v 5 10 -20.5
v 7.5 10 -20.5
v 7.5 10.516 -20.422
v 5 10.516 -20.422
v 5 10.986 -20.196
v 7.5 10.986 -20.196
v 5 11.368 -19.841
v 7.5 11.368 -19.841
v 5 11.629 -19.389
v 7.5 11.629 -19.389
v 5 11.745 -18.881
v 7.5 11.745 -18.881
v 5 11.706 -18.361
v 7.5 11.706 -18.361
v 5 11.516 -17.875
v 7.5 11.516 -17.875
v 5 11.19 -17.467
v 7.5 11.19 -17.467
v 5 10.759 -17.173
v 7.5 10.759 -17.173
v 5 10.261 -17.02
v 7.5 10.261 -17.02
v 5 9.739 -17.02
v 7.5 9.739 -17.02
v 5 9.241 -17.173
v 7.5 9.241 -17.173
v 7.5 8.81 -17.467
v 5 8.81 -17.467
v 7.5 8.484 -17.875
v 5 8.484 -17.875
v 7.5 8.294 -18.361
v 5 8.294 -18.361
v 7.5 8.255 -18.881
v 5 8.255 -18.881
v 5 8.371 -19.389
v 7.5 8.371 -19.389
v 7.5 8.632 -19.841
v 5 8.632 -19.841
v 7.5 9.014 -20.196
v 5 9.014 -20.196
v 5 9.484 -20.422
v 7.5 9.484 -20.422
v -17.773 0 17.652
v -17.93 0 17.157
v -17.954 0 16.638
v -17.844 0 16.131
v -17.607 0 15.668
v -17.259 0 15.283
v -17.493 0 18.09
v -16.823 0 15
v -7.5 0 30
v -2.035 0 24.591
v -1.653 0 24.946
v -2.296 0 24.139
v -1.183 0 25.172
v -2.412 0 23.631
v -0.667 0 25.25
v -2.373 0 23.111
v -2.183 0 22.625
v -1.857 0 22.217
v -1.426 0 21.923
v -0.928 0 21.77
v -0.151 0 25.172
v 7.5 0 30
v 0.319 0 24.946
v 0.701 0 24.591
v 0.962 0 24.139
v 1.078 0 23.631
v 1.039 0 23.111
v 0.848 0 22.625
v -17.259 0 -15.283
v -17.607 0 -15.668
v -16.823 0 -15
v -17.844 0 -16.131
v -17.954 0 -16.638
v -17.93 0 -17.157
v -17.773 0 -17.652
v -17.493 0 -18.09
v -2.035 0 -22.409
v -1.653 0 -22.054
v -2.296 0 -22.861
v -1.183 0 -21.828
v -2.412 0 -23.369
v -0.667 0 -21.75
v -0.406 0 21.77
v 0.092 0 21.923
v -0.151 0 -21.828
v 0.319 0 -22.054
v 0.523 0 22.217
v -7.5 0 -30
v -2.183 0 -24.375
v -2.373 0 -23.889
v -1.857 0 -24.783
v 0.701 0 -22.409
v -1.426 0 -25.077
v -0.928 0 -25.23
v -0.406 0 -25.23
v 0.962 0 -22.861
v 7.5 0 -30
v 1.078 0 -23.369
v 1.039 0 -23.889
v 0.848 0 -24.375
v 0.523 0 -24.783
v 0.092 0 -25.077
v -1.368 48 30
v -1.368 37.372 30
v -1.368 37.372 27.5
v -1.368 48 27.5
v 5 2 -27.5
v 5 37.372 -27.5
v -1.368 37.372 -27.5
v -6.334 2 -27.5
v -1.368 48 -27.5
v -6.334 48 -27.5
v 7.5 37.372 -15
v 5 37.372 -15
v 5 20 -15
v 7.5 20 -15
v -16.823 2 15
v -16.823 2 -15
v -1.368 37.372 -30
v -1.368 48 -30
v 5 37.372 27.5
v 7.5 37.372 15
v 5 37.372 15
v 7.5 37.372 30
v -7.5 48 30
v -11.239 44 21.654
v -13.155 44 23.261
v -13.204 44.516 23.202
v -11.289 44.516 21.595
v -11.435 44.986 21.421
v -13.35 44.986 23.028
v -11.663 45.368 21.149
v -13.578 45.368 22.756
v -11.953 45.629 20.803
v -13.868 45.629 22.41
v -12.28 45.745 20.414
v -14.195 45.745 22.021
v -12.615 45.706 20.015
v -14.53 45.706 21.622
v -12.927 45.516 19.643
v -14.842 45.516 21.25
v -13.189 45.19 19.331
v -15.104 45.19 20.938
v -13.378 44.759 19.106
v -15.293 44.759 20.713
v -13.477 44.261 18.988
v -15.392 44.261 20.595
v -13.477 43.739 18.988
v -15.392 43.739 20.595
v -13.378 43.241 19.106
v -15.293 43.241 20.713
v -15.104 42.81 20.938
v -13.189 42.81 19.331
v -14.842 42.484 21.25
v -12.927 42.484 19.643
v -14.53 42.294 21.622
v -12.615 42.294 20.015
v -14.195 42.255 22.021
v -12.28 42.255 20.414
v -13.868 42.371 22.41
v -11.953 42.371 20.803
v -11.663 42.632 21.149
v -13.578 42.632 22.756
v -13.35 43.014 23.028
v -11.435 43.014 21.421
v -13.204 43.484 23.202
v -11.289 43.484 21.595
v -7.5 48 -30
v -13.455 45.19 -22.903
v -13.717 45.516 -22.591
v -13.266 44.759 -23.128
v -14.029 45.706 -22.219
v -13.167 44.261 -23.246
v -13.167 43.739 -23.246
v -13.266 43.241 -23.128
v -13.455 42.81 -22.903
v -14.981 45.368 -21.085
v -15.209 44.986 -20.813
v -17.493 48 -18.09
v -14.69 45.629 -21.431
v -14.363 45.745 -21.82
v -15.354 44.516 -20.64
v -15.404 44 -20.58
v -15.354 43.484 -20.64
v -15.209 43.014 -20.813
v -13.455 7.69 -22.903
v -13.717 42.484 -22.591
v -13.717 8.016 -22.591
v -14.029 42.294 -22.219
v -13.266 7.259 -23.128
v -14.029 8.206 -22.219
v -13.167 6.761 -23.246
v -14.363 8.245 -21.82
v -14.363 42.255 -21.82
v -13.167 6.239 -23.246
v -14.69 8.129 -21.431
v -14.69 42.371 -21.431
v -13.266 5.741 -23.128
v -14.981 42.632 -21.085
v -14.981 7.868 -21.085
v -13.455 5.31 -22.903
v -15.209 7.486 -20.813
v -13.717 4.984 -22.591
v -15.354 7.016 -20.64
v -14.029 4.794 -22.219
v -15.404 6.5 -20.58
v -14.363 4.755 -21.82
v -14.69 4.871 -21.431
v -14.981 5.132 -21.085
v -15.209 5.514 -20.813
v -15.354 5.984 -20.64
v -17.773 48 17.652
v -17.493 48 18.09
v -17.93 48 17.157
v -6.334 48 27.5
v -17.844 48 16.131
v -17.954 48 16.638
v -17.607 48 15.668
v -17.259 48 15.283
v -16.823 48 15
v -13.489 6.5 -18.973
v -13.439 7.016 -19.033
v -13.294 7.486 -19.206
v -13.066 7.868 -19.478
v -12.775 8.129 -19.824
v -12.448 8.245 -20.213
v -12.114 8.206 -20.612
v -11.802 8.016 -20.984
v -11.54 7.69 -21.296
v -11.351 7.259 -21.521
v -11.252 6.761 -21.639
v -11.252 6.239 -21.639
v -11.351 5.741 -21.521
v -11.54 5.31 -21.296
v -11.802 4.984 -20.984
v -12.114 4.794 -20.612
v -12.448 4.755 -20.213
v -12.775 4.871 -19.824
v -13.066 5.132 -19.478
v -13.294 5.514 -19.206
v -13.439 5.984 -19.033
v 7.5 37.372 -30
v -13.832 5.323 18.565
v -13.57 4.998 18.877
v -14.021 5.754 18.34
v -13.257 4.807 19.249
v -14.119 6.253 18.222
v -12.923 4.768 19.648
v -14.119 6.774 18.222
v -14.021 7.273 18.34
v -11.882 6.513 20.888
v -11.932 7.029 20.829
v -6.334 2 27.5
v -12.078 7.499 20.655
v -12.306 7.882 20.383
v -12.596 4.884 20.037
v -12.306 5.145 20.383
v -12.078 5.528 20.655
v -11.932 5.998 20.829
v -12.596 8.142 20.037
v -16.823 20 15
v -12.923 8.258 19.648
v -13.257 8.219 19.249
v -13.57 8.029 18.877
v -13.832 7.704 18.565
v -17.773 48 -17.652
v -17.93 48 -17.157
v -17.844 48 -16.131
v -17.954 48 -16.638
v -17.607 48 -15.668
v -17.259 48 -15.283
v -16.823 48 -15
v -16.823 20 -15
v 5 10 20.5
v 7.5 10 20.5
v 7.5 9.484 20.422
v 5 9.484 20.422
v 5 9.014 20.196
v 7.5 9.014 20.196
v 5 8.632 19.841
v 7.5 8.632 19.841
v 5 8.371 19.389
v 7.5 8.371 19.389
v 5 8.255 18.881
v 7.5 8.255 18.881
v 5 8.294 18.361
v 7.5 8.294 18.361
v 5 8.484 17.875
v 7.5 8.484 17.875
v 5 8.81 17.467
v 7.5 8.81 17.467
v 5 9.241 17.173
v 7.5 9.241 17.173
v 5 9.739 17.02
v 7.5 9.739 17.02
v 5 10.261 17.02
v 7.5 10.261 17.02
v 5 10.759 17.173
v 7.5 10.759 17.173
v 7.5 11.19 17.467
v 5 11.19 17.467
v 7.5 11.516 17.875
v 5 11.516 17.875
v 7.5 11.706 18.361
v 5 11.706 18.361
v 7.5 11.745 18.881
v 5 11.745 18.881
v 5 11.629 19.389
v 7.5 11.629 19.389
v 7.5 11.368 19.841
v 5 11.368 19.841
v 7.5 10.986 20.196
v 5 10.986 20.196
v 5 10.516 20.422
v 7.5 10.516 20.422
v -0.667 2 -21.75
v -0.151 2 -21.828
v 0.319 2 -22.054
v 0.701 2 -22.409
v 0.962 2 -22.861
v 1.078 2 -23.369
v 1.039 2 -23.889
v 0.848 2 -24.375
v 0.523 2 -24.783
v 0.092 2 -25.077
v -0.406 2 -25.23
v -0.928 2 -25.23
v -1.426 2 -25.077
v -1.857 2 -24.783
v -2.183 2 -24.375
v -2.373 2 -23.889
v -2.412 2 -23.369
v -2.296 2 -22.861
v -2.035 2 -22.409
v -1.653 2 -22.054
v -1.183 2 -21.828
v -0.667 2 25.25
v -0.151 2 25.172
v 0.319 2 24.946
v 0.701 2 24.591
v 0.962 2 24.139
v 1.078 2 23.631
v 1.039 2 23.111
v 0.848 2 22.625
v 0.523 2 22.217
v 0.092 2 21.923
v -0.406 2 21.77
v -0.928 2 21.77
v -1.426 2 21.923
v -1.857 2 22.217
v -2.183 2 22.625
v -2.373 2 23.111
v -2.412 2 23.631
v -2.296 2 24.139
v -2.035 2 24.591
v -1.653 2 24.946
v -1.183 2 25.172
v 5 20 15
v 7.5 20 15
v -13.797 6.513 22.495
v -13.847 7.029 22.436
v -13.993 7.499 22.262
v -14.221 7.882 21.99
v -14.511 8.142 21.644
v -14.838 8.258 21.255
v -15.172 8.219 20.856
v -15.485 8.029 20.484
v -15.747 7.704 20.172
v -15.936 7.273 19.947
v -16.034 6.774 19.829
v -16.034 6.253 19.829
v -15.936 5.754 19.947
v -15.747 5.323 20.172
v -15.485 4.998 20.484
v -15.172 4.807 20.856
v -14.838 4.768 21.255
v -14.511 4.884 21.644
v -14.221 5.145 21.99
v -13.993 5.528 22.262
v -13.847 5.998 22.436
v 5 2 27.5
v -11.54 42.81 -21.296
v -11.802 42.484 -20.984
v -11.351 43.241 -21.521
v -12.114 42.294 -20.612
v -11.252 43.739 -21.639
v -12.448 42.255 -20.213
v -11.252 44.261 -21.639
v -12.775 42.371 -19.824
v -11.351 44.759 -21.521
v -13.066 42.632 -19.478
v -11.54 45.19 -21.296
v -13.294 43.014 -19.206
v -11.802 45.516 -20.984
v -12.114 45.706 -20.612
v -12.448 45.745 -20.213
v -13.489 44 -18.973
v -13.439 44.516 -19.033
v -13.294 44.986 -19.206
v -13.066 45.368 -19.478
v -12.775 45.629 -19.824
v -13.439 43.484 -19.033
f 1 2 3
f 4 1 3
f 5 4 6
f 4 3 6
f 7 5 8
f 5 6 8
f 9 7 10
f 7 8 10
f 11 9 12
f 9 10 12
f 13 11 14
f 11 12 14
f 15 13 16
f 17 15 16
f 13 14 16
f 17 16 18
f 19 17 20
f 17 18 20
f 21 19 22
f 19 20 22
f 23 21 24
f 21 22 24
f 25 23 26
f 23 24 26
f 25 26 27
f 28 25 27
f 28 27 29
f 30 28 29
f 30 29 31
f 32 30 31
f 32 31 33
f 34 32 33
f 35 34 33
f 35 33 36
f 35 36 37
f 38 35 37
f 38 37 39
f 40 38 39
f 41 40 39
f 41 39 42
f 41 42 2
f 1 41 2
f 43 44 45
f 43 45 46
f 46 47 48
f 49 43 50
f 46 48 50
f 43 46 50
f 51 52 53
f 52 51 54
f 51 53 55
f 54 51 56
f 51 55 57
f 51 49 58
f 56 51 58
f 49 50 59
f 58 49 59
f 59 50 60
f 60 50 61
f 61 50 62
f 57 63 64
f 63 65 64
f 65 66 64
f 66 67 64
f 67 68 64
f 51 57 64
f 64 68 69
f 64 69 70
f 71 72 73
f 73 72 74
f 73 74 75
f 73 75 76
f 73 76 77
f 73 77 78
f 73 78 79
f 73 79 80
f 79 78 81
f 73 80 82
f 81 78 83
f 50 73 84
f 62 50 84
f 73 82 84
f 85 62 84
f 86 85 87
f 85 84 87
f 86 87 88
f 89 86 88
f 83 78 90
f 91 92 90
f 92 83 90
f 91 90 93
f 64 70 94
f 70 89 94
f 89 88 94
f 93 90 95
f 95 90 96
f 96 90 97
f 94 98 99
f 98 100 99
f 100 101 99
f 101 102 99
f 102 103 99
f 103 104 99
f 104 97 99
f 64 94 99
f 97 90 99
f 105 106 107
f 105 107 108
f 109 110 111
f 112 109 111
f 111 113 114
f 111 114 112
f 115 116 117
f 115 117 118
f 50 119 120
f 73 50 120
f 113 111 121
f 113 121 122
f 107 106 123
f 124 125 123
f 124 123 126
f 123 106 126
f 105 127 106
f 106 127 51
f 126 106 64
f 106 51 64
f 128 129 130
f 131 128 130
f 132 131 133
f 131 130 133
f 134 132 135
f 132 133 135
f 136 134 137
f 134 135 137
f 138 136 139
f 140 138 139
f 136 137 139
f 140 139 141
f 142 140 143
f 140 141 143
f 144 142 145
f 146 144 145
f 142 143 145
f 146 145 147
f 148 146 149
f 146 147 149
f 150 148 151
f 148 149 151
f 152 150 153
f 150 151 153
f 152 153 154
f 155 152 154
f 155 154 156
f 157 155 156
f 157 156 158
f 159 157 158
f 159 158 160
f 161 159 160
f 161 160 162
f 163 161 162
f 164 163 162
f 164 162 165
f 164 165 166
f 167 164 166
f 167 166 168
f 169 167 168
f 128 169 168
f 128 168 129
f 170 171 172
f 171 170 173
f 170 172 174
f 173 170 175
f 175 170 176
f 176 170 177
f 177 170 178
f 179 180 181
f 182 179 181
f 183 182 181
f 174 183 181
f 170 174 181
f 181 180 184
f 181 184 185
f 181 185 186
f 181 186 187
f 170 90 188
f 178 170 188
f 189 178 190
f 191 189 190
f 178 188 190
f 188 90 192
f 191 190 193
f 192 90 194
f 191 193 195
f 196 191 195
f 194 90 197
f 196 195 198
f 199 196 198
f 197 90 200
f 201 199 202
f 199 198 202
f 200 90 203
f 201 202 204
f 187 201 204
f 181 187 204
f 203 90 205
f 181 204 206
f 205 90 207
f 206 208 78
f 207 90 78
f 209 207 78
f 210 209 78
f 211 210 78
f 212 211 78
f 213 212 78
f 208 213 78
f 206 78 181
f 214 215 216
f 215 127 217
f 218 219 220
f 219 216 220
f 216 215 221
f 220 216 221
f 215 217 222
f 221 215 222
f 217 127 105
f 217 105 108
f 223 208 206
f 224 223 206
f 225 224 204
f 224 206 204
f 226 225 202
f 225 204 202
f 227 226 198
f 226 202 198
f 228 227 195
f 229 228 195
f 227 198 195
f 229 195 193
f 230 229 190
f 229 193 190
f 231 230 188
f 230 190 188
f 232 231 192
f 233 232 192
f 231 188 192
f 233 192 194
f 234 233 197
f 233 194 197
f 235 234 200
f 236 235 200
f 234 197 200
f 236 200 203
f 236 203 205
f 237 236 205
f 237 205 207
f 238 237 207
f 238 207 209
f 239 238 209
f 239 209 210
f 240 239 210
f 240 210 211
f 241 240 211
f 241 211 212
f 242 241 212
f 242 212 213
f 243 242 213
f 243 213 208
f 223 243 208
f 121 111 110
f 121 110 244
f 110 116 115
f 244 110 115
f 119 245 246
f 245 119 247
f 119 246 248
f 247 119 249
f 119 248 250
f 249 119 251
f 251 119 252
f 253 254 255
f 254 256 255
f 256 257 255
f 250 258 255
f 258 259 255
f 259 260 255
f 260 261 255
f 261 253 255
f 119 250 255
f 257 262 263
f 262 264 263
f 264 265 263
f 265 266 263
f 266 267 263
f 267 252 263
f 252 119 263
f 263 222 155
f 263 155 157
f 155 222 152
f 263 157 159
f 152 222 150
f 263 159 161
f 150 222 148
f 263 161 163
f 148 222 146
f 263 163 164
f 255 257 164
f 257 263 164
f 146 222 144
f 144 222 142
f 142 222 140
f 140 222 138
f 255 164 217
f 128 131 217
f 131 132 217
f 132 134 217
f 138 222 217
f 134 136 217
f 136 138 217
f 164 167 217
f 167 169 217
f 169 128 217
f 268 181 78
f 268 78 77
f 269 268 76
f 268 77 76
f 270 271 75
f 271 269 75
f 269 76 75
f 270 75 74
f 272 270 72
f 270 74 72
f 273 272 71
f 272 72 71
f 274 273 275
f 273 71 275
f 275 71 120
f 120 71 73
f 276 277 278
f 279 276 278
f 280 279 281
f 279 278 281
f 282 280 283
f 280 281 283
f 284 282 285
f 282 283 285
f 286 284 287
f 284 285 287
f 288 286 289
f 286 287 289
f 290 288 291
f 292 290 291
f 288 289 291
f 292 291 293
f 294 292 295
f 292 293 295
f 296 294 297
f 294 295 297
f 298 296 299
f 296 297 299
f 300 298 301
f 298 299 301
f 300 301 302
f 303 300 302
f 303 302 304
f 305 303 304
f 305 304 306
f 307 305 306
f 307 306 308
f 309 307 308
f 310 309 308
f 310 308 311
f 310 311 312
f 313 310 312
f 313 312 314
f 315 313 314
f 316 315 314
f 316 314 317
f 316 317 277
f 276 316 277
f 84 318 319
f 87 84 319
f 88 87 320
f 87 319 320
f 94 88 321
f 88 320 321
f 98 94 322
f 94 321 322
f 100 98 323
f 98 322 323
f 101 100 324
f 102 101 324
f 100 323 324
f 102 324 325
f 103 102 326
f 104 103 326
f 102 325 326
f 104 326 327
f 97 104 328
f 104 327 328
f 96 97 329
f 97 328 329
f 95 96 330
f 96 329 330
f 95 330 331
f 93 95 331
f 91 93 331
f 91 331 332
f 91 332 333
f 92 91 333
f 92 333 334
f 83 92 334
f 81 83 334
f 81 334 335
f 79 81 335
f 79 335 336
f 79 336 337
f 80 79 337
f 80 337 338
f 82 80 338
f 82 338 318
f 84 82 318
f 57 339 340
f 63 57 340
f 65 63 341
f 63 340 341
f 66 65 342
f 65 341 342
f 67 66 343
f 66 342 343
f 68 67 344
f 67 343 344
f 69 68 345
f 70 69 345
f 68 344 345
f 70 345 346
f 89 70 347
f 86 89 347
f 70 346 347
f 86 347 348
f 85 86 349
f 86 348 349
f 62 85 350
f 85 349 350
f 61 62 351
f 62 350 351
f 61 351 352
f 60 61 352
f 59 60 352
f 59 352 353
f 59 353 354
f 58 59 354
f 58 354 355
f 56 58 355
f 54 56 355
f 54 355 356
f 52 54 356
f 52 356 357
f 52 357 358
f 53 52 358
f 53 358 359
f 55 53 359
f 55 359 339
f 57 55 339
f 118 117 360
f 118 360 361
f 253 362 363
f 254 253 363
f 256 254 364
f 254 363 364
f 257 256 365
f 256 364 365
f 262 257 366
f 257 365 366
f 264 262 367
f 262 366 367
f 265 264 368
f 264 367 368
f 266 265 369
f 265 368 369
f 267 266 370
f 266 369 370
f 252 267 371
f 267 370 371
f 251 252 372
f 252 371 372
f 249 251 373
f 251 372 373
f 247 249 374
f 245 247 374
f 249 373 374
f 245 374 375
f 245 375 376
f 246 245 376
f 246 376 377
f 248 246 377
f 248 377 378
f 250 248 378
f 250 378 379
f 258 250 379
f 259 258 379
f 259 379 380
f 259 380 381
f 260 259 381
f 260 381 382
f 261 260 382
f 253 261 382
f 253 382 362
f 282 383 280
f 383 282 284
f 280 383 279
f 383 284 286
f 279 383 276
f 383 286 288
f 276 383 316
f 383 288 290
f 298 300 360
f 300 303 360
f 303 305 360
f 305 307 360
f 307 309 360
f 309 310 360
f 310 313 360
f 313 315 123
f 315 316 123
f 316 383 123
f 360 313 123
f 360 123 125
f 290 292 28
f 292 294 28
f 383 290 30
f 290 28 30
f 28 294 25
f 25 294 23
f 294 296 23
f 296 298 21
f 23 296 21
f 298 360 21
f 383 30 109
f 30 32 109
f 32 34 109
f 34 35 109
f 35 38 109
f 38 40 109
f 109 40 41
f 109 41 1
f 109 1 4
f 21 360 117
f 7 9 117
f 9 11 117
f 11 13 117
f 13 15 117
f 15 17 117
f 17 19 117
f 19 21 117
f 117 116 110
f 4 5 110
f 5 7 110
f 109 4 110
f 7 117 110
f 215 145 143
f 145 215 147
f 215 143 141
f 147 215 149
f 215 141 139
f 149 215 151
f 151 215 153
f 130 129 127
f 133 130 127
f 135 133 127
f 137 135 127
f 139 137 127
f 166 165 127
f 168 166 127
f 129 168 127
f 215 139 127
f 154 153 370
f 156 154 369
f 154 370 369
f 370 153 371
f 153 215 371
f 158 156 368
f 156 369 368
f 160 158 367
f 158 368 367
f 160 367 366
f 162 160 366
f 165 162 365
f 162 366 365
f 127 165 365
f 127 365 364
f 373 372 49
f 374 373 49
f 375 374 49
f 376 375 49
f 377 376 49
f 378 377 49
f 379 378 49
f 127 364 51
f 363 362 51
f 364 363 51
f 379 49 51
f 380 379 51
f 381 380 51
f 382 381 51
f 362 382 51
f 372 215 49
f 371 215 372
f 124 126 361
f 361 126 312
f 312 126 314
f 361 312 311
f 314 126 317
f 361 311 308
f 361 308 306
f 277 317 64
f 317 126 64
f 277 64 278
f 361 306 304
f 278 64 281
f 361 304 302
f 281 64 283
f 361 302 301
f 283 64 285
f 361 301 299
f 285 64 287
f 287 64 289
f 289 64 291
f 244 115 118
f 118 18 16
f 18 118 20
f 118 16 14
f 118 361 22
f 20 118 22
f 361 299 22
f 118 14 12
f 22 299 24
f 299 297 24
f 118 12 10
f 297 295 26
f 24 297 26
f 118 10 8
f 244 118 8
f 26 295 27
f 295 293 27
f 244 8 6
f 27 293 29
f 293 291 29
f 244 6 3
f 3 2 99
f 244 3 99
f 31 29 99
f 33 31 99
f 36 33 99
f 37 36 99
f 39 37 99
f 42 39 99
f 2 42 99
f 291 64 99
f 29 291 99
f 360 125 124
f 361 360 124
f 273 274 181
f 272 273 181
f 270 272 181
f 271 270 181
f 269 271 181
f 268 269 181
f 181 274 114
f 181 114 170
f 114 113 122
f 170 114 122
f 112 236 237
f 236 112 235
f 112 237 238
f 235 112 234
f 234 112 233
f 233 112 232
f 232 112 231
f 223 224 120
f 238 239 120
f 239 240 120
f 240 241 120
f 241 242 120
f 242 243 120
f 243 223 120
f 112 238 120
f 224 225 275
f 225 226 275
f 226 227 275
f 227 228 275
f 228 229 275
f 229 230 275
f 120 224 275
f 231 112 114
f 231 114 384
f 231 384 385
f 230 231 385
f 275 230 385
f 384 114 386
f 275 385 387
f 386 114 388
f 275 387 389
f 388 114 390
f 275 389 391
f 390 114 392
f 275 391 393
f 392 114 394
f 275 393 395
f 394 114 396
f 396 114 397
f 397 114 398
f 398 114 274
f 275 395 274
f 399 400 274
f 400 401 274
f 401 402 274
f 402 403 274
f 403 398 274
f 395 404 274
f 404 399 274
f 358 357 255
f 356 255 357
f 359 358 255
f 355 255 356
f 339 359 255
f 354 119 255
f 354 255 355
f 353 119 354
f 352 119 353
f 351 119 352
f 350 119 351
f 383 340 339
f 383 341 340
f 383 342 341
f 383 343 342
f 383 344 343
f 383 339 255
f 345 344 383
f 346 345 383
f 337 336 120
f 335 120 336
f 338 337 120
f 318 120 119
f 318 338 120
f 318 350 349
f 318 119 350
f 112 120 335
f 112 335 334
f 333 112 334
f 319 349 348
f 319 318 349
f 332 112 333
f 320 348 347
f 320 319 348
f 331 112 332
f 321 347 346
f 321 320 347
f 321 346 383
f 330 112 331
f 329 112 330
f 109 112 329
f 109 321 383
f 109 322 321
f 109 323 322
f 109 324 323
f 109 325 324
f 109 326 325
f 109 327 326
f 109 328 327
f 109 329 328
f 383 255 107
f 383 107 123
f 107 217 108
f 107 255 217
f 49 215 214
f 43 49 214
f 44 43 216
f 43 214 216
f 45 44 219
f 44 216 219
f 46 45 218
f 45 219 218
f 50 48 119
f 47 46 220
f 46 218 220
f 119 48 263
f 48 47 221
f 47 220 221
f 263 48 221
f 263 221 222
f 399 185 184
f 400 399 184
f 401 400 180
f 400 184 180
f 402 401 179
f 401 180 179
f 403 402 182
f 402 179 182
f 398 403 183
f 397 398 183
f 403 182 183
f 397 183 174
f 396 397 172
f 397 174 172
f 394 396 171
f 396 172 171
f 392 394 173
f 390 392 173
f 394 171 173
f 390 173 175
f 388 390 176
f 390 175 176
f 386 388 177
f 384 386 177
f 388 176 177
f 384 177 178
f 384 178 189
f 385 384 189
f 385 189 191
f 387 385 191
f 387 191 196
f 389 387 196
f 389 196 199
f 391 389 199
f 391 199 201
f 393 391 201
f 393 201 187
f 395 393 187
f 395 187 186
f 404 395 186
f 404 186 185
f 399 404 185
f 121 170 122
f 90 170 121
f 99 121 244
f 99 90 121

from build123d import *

# Parameters (mm, degrees)
SKETCH_1_W          = 15
SKETCH_1_H          = 60
EXTRUDE_1_DEPTH     = 55
CUT_EXTRUDE_1_DEPTH = 53
SKETCH_3_W          = 78.566437997
SKETCH_3_H          = 30
CUT_EXTRUDE_2_DEPTH = 35
CUT_EXTRUDE_3_DEPTH = 25
FILLET_1_R          = 2
SKETCH_5_R          = 1.75
CUT_EXTRUDE_4_DEPTH = 3
SKETCH_6_R          = 1.75
CUT_EXTRUDE_5_DEPTH = 3
SKETCH_7_R          = 1.75
CUT_EXTRUDE_6_DEPTH = 3
SKETCH_8_W          = 60
SKETCH_8_H          = 7
CUT_EXTRUDE_7_DEPTH = 68.625993731
SKETCH_9_R          = 1.75
CUT_EXTRUDE_8_DEPTH = 10
SKETCH_10_W         = 8.867546431
SKETCH_10_H         = 10.62822389
CUT_EXTRUDE_9_DEPTH = 78


with BuildPart() as part:
    # 草图1 → 凸台-拉伸1 (new body)
    with BuildSketch(Plane(origin=(0, 0, 0), x_dir=(1, 0, 0), z_dir=(0, 1, 0))):
        Polygon((-7.5, 30), (-32.672988935, 0), (-7.5, -30), align=None)
        Rectangle(SKETCH_1_W, SKETCH_1_H)
    extrude(amount=EXTRUDE_1_DEPTH)

    # 草图2 → 切除-拉伸1 (cut)
    with BuildSketch(Plane(origin=(0, 55, 0), x_dir=(1, 0, 0), z_dir=(0, 1, 0))):
        Polygon((-6.334230855, 27.5), (-29.409470712, 0), (-6.334230855, -27.5), (5, -27.5), (5, 27.5), align=None)
    extrude(amount=-CUT_EXTRUDE_1_DEPTH, mode=Mode.SUBTRACT)

    # 草图3 → 切除-拉伸2 (cut)
    with BuildSketch(Plane(origin=(0, 55, 0), x_dir=(1, 0, 0), z_dir=(0, 1, 0))):
        with Locations((-12.586494467, 0)):
            Rectangle(SKETCH_3_W, SKETCH_3_H)
    extrude(amount=-CUT_EXTRUDE_2_DEPTH, mode=Mode.SUBTRACT)

    # 草图4 → 切除-拉伸3 (cut)
    with BuildSketch(Plane(origin=(0, 20, 0), x_dir=(1, 0, 0), z_dir=(0, 1, 0))):
        Polygon((-16.822976244, 15), (-73.584466249, 15), (-53.824577323, -15), (-16.822976244, -15), align=None)
    extrude(amount=-CUT_EXTRUDE_3_DEPTH, mode=Mode.SUBTRACT)

    # 圆角1
    # the kernel refuses this fillet: 2 mm, written as the material it takes off along each edge
    with BuildSketch(Plane(origin=(-20.086494468, 65.085601878, 15), x_dir=(1, 0, 0), z_dir=(0, -1, 0))) as fillet_1_piece_1:
        with BuildLine():
            CenterArc((4.125248856, 1.80483249), FILLET_1_R, 140, 104.477512186)
            Line((2.593159969, 3.09040771), (2.562518192, 3.116119214))
            Line((2.562518192, 3.116119214), (-0.030641778, 0.025711504))
            Line((-0.030641778, 0.025711504), (0, -0.04))
            ThreePointArc((0, -0.04), (1.631759112, -0.04), (3.246283611, -0.03609665))
            Line((3.246283611, -0.03609665), (3.263518223, 0))
        make_face()
    extrude(amount=75.171203755, mode=Mode.SUBTRACT)
    with BuildSketch(Plane(origin=(-20.086494468, -10.085601878, -15), x_dir=(0.6427876096865405, 0, -0.7660444431189769), z_dir=(0, 1, 0))) as fillet_1_piece_2:
        with BuildLine():
            CenterArc((4.034240751, -2), FILLET_1_R, 90, 104.477512186)
            Line((2.097749078, -2.5), (2.059019244, -2.51))
            ThreePointArc((2.059019244, -2.51), (1.018232761, -1.275711504), (-0.030641778, -0.025711504))
            Line((-0.030641778, -0.025711504), (0, 0.04))
            Line((0, 0.04), (4.034240751, 0.04))
            Line((4.034240751, 0.04), (4.034240751, 0))
        make_face()
    extrude(amount=75.171203755, mode=Mode.SUBTRACT)

    # 草图5 → 切除-拉伸4 (cut)
    with BuildSketch(Plane(origin=(-19.173296961, 0, 16.088306409), x_dir=(0.6427876096865413, 0, 0.7660444431189765), z_dir=(-0.7660444431189765, 0, 0.6427876096865413))):
        with Locations((7.613557632, 44)):
            Circle(SKETCH_5_R)
        with Locations((6.613557632, 6.513335705)):
            Circle(SKETCH_5_R)
    extrude(amount=-CUT_EXTRUDE_4_DEPTH, mode=Mode.SUBTRACT)

    # 草图6 → 切除-拉伸5 (cut)
    with BuildSketch(Plane(origin=(-19.173296961, 0, -16.088306409), x_dir=(-0.642787609686541, 0, 0.7660444431189768), z_dir=(-0.7660444431189768, 0, -0.642787609686541))):
        with Locations((-7.613557632, 44)):
            Circle(SKETCH_6_R)
        with Locations((-7.613557632, 6.5)):
            Circle(SKETCH_6_R)
    extrude(amount=-CUT_EXTRUDE_5_DEPTH, mode=Mode.SUBTRACT)

    # 草图7 → 切除-拉伸6 (cut)
    with BuildSketch(Plane(origin=(7.5, 0, 0), x_dir=(0, 0, -1), z_dir=(1, 0, 0))):
        with Locations((18.75, 10)):
            Circle(SKETCH_7_R)
        with Locations(Location((-18.75, 10, 0), (0, 0, 180))):
            Circle(SKETCH_7_R)
    extrude(amount=-CUT_EXTRUDE_6_DEPTH, mode=Mode.SUBTRACT)

    # 草图8 → 切除-拉伸7 (cut, through all)
    with BuildSketch(Plane(origin=(7.5, 0, 0), x_dir=(0, 0, -1), z_dir=(1, 0, 0))):
        with Locations((0, 51.5)):
            Rectangle(SKETCH_8_W, SKETCH_8_H)
    extrude(amount=-CUT_EXTRUDE_7_DEPTH, mode=Mode.SUBTRACT)

    # 草图9 → 切除-拉伸8 (cut)
    with BuildSketch(Plane(origin=(0, 2, 0), x_dir=(1, 0, 0), z_dir=(0, 1, 0))):
        with Locations(Location((-0.667115427, -23.5, 0), (0, 0, 270))):
            Circle(SKETCH_9_R)
        with Locations(Location((-0.667115427, 23.5, 0), (0, 0, 270))):
            Circle(SKETCH_9_R)
    extrude(amount=-CUT_EXTRUDE_8_DEPTH, mode=Mode.SUBTRACT)

    # 草图10 → 切除-拉伸9 (cut)
    with BuildSketch(Plane.XY.offset(30)):
        with Locations((3.066226785, 42.685888055)):
            Rectangle(SKETCH_10_W, SKETCH_10_H)
    extrude(amount=-CUT_EXTRUDE_9_DEPTH, mode=Mode.SUBTRACT)


solid = part.part
